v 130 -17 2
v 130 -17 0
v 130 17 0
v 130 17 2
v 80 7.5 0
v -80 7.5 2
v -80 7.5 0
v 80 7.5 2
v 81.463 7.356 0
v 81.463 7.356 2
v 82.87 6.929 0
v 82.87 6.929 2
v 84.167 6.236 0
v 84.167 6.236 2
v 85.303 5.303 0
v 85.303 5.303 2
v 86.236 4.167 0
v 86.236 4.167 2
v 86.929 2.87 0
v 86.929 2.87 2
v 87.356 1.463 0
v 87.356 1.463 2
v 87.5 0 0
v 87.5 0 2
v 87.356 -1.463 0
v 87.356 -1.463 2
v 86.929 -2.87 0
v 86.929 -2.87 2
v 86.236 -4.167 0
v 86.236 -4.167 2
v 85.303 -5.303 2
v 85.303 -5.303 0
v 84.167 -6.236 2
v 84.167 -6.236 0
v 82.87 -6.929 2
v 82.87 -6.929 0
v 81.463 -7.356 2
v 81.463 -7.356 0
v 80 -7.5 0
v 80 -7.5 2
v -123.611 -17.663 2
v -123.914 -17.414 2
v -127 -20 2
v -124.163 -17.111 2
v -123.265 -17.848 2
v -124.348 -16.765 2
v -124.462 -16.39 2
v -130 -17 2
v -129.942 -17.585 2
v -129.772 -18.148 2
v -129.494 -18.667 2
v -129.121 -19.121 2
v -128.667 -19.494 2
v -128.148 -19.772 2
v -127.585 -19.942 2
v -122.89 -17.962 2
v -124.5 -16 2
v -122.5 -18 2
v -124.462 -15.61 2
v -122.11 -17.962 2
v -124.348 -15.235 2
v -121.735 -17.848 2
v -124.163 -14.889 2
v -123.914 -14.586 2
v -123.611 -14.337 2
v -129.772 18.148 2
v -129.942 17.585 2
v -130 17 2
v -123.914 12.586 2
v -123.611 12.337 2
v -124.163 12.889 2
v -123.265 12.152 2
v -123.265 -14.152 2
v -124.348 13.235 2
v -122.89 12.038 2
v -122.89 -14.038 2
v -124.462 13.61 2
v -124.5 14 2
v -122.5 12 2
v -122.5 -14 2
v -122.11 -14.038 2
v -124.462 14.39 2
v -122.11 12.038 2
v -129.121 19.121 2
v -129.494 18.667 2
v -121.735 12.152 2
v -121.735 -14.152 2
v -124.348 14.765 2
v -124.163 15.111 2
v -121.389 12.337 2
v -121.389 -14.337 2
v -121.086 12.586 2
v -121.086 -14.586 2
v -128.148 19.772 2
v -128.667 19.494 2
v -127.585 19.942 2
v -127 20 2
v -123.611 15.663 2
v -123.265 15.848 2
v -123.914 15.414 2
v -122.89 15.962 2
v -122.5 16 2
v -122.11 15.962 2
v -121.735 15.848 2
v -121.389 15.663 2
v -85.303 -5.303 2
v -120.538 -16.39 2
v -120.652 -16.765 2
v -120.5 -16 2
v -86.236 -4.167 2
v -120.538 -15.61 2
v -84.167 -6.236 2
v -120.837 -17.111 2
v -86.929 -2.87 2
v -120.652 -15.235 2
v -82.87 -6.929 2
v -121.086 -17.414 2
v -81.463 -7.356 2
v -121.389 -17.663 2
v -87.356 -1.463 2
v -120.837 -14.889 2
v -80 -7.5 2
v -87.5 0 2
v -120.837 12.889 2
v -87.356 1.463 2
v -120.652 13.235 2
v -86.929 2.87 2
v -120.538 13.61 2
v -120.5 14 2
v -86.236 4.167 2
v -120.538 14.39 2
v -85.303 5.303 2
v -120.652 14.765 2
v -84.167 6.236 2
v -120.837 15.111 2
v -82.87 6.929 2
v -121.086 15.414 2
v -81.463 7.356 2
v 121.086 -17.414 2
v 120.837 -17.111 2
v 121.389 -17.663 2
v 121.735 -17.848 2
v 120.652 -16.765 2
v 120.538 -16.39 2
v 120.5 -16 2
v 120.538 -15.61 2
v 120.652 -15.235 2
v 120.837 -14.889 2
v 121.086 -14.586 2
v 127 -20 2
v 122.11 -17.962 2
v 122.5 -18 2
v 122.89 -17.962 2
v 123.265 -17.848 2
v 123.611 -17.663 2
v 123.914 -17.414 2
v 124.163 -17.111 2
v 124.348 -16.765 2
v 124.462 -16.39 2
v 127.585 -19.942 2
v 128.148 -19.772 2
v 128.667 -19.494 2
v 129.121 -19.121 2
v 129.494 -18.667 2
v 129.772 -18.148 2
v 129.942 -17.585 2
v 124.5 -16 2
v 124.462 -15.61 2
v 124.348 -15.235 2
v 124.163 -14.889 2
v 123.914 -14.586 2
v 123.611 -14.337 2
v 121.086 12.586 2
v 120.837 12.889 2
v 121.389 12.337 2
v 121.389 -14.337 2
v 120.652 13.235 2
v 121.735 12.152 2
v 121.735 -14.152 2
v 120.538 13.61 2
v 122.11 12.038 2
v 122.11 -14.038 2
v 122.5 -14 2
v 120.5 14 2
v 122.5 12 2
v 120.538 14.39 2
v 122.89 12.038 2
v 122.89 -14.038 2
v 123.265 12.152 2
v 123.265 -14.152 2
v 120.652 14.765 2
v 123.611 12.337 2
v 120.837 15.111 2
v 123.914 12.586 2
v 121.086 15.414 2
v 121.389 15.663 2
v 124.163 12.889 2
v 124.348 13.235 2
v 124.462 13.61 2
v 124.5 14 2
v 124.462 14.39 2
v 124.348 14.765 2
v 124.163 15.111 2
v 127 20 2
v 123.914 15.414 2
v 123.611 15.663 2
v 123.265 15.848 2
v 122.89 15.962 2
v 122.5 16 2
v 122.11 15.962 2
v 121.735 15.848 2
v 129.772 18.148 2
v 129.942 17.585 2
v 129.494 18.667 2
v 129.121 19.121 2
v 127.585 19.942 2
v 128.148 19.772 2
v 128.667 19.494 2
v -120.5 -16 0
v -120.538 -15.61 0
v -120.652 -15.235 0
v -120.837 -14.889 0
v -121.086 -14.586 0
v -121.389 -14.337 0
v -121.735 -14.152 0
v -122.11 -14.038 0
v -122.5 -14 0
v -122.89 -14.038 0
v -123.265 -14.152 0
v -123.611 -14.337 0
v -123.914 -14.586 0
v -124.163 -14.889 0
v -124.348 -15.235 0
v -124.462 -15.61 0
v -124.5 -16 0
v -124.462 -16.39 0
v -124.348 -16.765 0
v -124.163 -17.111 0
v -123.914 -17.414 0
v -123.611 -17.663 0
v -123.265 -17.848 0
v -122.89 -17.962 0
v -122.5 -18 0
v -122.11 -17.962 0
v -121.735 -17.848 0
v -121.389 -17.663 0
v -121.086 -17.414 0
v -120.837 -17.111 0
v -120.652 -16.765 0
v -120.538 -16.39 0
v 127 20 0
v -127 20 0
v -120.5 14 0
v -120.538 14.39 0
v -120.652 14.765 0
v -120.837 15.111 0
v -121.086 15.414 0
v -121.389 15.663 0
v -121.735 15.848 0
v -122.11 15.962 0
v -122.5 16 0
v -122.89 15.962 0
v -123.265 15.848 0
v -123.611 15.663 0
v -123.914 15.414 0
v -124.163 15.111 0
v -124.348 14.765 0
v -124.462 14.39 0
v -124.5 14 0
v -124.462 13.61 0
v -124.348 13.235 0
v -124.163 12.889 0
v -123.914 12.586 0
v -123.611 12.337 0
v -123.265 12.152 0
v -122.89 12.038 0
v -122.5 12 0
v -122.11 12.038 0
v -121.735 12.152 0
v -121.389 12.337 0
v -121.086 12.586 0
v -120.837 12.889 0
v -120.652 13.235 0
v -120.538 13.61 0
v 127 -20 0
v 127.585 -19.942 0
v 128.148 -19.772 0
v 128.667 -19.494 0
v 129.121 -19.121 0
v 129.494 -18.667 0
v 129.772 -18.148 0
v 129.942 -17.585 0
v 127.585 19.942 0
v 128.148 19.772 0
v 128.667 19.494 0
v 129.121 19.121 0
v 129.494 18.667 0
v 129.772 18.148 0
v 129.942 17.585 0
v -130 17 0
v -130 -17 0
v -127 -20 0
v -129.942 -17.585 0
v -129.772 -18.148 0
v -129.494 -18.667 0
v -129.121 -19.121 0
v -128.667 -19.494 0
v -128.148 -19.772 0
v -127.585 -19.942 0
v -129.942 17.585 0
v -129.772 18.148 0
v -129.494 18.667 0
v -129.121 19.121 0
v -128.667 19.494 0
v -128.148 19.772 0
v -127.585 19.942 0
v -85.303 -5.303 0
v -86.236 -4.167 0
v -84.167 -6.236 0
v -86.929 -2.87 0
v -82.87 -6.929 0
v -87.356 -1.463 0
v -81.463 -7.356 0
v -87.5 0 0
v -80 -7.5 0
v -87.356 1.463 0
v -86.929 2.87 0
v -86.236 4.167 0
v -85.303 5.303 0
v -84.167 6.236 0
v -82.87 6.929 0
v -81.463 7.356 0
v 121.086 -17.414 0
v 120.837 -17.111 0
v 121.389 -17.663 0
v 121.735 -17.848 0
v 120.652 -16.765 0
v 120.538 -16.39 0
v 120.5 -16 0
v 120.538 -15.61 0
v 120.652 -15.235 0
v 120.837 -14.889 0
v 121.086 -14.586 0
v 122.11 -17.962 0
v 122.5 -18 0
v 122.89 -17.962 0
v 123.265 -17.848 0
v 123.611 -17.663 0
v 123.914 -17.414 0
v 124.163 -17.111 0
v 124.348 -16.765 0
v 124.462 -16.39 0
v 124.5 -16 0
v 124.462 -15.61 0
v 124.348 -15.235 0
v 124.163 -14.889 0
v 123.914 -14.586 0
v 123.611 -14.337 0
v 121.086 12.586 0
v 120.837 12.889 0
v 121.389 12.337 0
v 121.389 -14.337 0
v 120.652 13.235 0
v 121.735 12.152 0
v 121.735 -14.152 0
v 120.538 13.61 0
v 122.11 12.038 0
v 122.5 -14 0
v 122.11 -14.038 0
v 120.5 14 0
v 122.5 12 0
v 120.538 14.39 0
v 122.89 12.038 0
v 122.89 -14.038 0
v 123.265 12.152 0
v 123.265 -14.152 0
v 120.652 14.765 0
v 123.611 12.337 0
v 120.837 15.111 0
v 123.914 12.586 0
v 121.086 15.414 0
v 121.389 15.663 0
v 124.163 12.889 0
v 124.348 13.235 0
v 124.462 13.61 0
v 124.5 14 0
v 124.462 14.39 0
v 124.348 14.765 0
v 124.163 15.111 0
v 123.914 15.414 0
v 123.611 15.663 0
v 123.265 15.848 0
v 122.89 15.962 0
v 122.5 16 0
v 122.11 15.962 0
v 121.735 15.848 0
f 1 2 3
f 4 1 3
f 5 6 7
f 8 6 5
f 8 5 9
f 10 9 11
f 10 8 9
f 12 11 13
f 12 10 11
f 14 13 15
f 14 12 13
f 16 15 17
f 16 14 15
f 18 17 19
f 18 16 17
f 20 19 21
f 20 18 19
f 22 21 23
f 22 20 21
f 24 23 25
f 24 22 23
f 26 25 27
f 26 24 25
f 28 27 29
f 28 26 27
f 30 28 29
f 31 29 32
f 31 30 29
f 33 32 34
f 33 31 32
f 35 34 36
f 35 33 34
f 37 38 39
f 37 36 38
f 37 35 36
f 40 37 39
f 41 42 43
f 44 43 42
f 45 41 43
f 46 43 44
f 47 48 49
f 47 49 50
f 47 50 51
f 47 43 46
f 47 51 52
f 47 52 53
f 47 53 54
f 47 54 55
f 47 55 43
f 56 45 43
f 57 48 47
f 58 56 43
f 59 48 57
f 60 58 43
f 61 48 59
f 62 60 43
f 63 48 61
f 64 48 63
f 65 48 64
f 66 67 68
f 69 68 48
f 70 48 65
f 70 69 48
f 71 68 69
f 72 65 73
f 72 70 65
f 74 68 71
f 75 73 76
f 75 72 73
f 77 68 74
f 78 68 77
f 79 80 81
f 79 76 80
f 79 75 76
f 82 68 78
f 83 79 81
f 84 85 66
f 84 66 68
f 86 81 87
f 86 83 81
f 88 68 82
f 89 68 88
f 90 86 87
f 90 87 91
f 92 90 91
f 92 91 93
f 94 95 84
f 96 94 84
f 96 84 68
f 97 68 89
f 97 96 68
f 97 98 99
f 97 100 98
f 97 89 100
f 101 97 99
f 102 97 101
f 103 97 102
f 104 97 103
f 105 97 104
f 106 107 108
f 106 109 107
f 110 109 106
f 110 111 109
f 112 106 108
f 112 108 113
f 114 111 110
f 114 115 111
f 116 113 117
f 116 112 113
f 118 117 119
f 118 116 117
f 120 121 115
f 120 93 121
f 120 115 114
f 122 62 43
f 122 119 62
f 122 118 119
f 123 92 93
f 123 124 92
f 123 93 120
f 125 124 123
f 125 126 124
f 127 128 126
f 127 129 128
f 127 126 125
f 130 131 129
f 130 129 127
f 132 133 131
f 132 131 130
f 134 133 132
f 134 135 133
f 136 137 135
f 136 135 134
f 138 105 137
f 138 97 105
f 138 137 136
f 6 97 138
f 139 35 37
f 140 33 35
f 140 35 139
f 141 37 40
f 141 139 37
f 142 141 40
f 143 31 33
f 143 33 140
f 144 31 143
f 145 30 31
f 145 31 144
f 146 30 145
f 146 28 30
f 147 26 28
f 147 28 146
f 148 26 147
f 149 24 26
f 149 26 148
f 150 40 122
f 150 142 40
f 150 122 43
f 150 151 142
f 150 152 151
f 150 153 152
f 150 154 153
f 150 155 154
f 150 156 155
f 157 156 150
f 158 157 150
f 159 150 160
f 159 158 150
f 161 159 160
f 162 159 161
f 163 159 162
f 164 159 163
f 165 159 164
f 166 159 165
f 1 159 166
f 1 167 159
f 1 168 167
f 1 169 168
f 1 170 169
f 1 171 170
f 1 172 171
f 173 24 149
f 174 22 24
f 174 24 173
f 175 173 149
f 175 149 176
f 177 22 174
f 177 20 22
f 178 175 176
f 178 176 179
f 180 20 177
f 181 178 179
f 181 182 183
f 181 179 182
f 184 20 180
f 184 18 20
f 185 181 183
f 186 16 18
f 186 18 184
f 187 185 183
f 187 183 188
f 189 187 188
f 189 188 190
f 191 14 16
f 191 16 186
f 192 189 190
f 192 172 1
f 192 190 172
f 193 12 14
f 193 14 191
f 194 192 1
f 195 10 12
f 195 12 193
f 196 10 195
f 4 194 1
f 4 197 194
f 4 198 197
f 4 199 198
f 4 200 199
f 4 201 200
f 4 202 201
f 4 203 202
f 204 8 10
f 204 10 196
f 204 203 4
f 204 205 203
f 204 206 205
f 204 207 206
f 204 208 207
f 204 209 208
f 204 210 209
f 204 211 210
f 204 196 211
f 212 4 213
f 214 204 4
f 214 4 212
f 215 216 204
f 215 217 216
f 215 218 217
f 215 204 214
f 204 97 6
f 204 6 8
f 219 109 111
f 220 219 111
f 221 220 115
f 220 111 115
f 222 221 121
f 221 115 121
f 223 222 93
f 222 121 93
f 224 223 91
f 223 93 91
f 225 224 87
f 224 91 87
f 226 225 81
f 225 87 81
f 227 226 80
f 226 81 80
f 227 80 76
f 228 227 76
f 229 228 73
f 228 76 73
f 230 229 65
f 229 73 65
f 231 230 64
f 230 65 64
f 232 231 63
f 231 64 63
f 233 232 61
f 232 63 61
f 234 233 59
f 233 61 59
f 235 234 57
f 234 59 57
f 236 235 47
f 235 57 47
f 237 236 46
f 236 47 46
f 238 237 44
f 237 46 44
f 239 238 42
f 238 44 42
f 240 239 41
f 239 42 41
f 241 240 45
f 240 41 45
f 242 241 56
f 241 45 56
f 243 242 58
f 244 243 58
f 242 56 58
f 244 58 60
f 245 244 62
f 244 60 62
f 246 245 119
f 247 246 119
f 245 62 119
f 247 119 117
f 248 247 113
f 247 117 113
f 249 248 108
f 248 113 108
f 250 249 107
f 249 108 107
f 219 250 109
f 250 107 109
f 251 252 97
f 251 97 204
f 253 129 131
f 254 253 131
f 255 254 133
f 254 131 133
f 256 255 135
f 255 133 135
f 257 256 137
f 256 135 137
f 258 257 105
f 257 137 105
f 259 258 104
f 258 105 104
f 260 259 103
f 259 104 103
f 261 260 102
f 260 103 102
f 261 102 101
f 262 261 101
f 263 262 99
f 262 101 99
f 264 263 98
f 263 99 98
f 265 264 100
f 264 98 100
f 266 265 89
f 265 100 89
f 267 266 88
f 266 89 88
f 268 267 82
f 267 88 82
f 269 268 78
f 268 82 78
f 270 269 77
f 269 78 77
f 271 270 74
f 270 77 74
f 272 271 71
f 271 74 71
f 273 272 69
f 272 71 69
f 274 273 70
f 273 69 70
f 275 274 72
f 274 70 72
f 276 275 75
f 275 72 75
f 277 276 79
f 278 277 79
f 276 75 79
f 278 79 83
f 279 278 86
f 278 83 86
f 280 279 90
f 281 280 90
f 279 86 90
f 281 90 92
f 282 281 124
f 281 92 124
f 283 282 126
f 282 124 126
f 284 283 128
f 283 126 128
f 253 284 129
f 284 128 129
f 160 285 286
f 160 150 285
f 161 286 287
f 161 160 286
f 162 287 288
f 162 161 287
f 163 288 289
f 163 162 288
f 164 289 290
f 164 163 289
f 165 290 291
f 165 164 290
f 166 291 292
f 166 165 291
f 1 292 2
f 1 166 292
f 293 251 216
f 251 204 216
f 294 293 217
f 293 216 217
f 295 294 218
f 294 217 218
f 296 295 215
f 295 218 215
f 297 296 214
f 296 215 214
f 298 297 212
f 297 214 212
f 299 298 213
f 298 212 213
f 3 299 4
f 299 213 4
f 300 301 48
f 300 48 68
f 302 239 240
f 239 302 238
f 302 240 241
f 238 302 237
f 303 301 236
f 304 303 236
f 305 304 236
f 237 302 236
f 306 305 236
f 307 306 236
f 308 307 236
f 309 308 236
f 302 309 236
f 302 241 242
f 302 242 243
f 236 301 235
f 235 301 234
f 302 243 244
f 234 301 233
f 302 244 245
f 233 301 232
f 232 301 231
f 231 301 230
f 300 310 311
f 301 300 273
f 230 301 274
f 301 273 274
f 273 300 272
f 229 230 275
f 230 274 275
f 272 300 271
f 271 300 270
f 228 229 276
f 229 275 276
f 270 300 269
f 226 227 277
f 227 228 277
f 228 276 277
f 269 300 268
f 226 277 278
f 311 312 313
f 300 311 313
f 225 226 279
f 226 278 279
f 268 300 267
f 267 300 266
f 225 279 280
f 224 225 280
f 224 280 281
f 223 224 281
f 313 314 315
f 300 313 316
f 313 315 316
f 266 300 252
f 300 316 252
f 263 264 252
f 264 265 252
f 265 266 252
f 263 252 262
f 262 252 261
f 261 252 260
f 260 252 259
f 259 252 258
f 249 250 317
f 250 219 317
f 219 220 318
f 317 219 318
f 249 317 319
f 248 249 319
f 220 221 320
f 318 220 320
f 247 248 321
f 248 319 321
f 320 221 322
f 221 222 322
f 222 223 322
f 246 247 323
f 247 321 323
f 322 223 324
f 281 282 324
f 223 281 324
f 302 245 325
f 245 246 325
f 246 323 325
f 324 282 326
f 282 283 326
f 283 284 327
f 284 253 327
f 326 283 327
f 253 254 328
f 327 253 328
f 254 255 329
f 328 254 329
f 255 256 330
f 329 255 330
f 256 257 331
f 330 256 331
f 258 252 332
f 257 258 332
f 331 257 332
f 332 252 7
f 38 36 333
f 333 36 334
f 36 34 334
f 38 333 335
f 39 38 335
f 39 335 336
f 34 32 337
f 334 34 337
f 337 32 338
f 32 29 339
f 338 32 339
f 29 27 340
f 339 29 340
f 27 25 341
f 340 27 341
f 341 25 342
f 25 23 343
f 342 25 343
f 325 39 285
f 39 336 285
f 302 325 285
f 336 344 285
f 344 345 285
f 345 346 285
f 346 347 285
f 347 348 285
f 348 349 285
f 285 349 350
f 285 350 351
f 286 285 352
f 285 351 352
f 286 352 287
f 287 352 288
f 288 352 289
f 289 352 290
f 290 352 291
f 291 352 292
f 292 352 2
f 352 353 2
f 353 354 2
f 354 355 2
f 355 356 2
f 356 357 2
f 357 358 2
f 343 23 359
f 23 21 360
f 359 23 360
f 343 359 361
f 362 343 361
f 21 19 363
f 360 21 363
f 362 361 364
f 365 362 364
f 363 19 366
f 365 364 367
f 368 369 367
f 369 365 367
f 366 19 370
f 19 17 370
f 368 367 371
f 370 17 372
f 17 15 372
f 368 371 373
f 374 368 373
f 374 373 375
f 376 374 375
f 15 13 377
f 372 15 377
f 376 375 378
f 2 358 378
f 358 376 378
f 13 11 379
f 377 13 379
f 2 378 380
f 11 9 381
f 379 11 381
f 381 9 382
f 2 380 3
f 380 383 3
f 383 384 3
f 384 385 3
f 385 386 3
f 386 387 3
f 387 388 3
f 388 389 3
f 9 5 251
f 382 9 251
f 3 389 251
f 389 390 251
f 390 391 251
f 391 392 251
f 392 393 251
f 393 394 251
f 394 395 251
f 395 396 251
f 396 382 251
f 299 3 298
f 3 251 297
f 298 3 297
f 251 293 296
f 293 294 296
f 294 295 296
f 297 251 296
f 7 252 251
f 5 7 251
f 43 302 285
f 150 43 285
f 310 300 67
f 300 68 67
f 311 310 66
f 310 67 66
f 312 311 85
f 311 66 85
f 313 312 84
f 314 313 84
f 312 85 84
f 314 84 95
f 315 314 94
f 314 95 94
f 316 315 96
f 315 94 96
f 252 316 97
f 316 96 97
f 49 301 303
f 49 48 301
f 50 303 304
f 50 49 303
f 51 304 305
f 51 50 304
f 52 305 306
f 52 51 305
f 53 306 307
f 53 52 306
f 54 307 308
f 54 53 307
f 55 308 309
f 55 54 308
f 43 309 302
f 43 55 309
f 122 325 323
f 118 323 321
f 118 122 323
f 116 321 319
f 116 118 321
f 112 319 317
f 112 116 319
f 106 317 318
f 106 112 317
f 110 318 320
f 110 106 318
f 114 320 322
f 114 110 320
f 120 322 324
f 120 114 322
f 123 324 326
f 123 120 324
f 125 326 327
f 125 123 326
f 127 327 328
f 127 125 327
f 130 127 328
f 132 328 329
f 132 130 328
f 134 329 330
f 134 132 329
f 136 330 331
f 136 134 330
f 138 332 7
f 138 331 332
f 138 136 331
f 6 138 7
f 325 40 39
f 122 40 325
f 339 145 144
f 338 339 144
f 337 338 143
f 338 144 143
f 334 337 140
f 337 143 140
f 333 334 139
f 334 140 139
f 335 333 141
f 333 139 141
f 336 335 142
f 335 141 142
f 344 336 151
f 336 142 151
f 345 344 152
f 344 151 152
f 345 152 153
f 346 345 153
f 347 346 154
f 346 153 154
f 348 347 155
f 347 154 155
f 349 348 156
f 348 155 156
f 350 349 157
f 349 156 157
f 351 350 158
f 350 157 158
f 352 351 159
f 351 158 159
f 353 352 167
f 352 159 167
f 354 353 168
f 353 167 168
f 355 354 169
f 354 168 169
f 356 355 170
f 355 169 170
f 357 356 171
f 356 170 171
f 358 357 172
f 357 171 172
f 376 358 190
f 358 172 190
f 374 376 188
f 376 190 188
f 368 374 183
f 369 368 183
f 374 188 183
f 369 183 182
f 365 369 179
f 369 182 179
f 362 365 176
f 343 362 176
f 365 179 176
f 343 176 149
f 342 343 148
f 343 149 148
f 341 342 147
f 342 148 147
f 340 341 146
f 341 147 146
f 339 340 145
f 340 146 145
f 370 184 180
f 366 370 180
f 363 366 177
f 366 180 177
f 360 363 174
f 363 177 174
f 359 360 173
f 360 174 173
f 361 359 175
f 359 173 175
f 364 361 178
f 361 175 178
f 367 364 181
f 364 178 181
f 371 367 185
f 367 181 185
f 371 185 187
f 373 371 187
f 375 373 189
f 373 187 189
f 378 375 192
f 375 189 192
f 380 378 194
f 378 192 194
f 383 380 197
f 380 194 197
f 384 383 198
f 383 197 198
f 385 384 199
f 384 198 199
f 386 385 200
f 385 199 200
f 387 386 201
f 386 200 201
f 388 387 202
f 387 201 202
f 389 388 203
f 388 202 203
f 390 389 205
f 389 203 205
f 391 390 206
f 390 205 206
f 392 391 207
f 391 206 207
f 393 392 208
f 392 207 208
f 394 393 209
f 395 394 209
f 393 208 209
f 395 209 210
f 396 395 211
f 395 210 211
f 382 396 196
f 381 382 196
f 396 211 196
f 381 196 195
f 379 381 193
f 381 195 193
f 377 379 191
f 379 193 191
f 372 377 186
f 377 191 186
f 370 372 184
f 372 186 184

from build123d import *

# Parameters (mm, degrees)
SKETCH_1_W          = 260
SKETCH_1_H          = 40
EXTRUDE_1_DEPTH     = 2
SKETCH_3_R          = 2
CUT_EXTRUDE_2_DEPTH = 2
CUT_EXTRUDE_3_DEPTH = 132.544669219
FILLET_1_R          = 3


with BuildPart() as part:
    # 草图1 → 凸台-拉伸1 (new body)
    with BuildSketch(Plane.XY):
        Rectangle(SKETCH_1_W, SKETCH_1_H)
    extrude(amount=EXTRUDE_1_DEPTH)

    # 草图3 → 切除-拉伸2 (cut)
    with BuildSketch(Plane.XY.offset(2)):
        with Locations((-122.5, 14)):
            Circle(SKETCH_3_R)
        with Locations((-122.5, -16)):
            Circle(SKETCH_3_R)
        with Locations(Location((122.5, -16, 0), (0, 0, 180))):
            Circle(SKETCH_3_R)
        with Locations(Location((122.5, 14, 0), (0, 0, 180))):
            Circle(SKETCH_3_R)
    extrude(amount=-CUT_EXTRUDE_2_DEPTH, mode=Mode.SUBTRACT)

    # 草图4 → 切除-拉伸3 (cut, through all)
    with BuildSketch(Plane.XY.offset(2)):
        with BuildLine():
            Line((-80, 7.5), (80, 7.5))
            ThreePointArc((80, 7.5), (87.5, 0), (80, -7.5))
            Line((80, -7.5), (-80, -7.5))
            ThreePointArc((-80, -7.5), (-87.5, 0), (-80, 7.5))
        make_face()
    extrude(amount=-CUT_EXTRUDE_3_DEPTH, mode=Mode.SUBTRACT)

    # 圆角1
    fillet_1_edges = [part.edges().sort_by_distance(p)[0] for p in [
        (130, -20, 1),
        (-130, -20, 1),
        (-130, 20, 1),
        (130, 20, 1),
    ]]
    fillet(fillet_1_edges, radius=FILLET_1_R)


solid = part.part
